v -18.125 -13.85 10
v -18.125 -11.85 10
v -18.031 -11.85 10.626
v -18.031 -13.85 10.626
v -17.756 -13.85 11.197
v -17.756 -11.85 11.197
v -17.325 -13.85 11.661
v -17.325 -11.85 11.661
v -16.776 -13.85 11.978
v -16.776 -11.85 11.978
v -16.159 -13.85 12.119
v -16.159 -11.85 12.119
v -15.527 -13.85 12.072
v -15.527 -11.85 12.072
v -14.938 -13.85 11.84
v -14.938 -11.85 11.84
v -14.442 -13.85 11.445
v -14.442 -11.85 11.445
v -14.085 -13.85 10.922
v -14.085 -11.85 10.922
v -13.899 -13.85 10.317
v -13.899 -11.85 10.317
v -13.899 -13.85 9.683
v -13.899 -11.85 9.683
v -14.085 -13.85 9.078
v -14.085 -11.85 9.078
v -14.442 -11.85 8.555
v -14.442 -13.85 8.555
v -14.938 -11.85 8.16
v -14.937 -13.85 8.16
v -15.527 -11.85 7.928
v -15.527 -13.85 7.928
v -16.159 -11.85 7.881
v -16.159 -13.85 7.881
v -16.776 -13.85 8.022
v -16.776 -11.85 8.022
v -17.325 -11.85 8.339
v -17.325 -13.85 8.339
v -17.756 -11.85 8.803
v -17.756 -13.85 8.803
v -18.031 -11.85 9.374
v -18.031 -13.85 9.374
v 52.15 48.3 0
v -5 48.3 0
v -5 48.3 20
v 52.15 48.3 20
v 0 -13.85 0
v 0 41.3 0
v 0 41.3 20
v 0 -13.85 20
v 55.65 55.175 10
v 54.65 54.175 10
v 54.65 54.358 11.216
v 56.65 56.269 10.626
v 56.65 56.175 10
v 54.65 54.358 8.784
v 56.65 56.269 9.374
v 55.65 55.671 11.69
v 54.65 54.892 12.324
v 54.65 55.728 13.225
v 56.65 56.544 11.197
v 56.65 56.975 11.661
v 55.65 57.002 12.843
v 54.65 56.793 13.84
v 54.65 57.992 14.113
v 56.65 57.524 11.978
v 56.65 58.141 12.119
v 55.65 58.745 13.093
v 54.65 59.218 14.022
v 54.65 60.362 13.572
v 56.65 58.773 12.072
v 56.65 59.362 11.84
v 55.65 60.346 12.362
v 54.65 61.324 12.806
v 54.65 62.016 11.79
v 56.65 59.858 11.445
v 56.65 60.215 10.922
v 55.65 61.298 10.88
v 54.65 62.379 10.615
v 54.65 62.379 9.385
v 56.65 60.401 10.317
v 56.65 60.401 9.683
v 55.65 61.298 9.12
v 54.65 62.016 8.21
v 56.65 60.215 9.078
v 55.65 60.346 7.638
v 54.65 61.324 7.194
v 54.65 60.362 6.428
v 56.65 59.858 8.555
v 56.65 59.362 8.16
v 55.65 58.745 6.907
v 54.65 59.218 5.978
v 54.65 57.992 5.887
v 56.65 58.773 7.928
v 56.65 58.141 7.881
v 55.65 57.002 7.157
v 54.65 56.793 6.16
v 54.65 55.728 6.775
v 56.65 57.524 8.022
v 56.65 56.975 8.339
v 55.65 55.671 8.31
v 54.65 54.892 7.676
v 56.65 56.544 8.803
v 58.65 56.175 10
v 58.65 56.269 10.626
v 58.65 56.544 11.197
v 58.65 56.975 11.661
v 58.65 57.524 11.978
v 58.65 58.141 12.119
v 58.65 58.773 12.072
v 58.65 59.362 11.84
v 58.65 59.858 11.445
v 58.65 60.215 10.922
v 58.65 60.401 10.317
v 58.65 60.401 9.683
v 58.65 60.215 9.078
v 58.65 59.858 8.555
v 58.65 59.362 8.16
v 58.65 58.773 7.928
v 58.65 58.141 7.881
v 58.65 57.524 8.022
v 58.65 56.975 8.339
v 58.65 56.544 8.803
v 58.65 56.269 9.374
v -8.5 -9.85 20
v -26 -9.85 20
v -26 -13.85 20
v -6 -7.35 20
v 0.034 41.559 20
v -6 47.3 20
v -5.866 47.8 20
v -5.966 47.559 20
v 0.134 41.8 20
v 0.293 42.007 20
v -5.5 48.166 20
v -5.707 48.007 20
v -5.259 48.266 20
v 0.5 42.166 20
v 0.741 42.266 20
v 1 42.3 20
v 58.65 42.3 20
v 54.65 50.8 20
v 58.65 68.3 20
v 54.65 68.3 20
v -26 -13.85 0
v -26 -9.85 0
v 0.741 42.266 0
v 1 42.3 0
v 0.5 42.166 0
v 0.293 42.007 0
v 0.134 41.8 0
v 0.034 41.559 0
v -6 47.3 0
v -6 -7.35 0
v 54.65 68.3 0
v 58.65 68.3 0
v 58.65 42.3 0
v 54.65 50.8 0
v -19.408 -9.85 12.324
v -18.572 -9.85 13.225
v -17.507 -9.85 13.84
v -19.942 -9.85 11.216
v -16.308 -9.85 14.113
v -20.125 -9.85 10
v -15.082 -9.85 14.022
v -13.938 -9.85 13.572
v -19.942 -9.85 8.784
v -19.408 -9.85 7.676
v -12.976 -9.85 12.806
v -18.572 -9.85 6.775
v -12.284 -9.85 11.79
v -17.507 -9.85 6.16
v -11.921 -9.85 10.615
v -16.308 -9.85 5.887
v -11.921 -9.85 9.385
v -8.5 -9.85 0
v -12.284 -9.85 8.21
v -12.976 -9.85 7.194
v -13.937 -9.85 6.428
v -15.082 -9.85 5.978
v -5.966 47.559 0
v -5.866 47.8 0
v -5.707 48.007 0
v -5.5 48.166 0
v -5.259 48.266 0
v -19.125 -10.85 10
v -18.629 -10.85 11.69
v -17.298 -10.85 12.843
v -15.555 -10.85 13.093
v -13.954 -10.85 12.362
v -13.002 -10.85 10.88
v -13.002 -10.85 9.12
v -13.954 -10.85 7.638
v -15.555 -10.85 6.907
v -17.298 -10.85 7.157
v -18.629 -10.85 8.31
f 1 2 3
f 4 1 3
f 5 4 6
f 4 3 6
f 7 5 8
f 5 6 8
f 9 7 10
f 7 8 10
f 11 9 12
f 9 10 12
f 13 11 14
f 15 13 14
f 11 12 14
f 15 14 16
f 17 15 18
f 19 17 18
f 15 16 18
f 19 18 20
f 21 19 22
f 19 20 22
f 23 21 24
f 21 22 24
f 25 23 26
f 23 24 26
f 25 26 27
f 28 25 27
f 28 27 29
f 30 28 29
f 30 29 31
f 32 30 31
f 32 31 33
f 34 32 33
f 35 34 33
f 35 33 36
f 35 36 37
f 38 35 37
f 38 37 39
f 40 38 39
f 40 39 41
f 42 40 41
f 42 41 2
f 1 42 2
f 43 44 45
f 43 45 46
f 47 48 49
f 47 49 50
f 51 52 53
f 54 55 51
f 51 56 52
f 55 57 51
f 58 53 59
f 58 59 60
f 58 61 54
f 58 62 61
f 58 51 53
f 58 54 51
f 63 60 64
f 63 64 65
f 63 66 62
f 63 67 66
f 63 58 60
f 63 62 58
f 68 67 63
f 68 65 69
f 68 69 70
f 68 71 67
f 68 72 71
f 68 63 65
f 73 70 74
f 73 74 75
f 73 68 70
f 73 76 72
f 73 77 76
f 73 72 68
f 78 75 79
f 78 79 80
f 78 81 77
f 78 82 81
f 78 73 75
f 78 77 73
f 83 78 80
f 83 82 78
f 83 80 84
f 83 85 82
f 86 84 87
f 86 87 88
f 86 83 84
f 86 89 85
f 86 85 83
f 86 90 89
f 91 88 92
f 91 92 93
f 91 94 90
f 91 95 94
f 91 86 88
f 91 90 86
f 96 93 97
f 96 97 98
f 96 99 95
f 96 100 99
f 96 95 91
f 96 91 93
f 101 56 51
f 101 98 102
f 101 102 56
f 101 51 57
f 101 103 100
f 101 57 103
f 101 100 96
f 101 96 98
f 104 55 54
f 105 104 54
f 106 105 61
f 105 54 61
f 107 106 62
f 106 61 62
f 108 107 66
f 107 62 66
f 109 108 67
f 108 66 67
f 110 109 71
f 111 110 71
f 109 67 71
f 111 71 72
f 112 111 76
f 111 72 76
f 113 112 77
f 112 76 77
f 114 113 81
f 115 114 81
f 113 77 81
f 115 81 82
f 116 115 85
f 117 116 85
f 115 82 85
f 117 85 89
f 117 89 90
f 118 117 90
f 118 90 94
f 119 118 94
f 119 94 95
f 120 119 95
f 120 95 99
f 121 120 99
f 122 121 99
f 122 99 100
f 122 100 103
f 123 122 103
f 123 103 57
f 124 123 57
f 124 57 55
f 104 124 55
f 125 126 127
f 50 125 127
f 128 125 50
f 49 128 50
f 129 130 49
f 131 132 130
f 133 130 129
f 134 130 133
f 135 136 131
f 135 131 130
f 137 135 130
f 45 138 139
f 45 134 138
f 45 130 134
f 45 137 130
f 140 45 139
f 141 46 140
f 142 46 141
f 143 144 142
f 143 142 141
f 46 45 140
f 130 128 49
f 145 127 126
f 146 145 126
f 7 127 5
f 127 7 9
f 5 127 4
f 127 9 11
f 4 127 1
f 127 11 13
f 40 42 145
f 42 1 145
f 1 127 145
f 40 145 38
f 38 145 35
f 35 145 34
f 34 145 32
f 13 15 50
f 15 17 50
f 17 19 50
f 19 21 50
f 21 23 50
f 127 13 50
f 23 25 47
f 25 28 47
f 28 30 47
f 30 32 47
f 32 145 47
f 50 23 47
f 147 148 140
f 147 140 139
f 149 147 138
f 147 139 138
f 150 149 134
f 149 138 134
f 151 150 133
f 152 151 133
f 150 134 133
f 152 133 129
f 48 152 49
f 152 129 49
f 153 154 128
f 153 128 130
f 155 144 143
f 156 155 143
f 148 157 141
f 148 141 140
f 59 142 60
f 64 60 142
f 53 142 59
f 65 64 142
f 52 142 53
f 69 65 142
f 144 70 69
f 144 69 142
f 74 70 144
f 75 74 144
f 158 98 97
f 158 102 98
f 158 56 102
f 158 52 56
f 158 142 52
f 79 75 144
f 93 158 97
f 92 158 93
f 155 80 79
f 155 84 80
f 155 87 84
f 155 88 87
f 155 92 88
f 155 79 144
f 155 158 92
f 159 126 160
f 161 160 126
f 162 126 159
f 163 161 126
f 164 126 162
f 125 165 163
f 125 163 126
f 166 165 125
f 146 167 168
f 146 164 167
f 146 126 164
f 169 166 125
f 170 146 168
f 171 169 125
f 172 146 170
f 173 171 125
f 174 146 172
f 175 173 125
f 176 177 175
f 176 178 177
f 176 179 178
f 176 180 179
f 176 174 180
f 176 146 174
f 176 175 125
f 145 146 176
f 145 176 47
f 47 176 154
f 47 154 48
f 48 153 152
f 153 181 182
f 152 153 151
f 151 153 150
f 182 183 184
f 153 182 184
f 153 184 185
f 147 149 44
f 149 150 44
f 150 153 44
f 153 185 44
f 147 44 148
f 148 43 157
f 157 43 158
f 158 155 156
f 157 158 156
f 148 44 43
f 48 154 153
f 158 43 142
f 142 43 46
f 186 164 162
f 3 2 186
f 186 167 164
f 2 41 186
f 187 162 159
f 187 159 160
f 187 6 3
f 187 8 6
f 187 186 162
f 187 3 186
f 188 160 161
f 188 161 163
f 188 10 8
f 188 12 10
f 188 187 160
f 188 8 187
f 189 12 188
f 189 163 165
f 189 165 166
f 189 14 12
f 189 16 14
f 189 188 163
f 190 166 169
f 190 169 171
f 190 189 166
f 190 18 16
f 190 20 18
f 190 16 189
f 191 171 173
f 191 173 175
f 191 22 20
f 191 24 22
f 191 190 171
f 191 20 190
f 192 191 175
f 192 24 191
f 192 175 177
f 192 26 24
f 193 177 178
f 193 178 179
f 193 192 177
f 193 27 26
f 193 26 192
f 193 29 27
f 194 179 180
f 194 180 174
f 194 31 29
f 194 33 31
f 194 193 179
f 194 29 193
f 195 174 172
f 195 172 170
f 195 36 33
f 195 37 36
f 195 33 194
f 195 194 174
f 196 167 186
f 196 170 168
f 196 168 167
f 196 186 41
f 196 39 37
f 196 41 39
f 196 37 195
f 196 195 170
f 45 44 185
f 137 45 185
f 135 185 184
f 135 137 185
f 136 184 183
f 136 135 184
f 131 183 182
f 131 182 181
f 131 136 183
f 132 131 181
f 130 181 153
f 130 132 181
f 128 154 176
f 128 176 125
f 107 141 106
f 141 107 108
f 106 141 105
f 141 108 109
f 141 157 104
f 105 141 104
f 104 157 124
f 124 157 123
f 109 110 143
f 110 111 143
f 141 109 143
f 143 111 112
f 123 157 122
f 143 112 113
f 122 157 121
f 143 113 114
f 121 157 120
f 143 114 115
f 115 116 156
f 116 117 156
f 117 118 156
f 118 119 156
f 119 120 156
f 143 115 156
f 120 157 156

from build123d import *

# Parameters (mm, degrees)
SKETCH1_W           = 20
SKETCH1_H           = 4
SKETCH1_W_2         = 4
SKETCH1_H_2         = 20
BOSS_EXTRUDE1_DEPTH = 20
SKETCH2_R           = 2.125
CUT_EXTRUDE1_DEPTH  = 100.735876193
SKETCH3_R           = 2.125
CUT_EXTRUDE2_DEPTH  = 108.560738655
CHAMFER1_SIZE       = 2
CHAMFER2_SIZE       = 2.5
FILLET1_R           = 1


with BuildPart() as part:
    # Sketch1 → Boss-Extrude1 (new body)
    with BuildSketch(Plane.XY):
        with Locations((-16, -11.85)):
            Rectangle(SKETCH1_W, SKETCH1_H)
        Polygon((58.65, 48.3), (58.65, 42.3), (0, 42.3), (0, -13.85), (-6, -13.85), (-6, 48.3), align=None)
        with Locations((56.65, 58.3)):
            Rectangle(SKETCH1_W_2, SKETCH1_H_2)
    extrude(amount=BOSS_EXTRUDE1_DEPTH)

    # Sketch2 → Cut-Extrude1 (cut, through all)
    with BuildSketch(Plane(origin=(0, -9.85, 0), x_dir=(1, 0, 0), z_dir=(0, 1, 0))):
        with Locations(Location((-16, -10, 0), (0, 0, 180))):
            Circle(SKETCH2_R)
    extrude(amount=-CUT_EXTRUDE1_DEPTH, mode=Mode.SUBTRACT)

    # Sketch3 → Cut-Extrude2 (cut, through all)
    with BuildSketch(Plane.ZY.offset(-54.65)):
        with Locations(Location((10, 58.3, 0), (0, 0, 270))):
            Circle(SKETCH3_R)
    extrude(amount=-CUT_EXTRUDE2_DEPTH, mode=Mode.SUBTRACT)

    # Chamfer1
    chamfer1_edges = [part.edges().sort_by_distance(p)[0] for p in [
        (-13.875, -9.85, 10),
        (54.65, 60.425, 10),
    ]]
    chamfer(chamfer1_edges, length=CHAMFER1_SIZE)

    # Chamfer2
    chamfer2_edges = [part.edges().sort_by_distance(p)[0] for p in [
        (-6, -9.85, 10),
        (54.65, 48.3, 10),
    ]]
    chamfer(chamfer2_edges, length=CHAMFER2_SIZE)

    # Fillet1
    fillet1_edges = [part.edges().sort_by_distance(p)[0] for p in [
        (-6, 48.3, 10),
        (0, 42.3, 10),
    ]]
    fillet(fillet1_edges, radius=FILLET1_R)


solid = part.part
